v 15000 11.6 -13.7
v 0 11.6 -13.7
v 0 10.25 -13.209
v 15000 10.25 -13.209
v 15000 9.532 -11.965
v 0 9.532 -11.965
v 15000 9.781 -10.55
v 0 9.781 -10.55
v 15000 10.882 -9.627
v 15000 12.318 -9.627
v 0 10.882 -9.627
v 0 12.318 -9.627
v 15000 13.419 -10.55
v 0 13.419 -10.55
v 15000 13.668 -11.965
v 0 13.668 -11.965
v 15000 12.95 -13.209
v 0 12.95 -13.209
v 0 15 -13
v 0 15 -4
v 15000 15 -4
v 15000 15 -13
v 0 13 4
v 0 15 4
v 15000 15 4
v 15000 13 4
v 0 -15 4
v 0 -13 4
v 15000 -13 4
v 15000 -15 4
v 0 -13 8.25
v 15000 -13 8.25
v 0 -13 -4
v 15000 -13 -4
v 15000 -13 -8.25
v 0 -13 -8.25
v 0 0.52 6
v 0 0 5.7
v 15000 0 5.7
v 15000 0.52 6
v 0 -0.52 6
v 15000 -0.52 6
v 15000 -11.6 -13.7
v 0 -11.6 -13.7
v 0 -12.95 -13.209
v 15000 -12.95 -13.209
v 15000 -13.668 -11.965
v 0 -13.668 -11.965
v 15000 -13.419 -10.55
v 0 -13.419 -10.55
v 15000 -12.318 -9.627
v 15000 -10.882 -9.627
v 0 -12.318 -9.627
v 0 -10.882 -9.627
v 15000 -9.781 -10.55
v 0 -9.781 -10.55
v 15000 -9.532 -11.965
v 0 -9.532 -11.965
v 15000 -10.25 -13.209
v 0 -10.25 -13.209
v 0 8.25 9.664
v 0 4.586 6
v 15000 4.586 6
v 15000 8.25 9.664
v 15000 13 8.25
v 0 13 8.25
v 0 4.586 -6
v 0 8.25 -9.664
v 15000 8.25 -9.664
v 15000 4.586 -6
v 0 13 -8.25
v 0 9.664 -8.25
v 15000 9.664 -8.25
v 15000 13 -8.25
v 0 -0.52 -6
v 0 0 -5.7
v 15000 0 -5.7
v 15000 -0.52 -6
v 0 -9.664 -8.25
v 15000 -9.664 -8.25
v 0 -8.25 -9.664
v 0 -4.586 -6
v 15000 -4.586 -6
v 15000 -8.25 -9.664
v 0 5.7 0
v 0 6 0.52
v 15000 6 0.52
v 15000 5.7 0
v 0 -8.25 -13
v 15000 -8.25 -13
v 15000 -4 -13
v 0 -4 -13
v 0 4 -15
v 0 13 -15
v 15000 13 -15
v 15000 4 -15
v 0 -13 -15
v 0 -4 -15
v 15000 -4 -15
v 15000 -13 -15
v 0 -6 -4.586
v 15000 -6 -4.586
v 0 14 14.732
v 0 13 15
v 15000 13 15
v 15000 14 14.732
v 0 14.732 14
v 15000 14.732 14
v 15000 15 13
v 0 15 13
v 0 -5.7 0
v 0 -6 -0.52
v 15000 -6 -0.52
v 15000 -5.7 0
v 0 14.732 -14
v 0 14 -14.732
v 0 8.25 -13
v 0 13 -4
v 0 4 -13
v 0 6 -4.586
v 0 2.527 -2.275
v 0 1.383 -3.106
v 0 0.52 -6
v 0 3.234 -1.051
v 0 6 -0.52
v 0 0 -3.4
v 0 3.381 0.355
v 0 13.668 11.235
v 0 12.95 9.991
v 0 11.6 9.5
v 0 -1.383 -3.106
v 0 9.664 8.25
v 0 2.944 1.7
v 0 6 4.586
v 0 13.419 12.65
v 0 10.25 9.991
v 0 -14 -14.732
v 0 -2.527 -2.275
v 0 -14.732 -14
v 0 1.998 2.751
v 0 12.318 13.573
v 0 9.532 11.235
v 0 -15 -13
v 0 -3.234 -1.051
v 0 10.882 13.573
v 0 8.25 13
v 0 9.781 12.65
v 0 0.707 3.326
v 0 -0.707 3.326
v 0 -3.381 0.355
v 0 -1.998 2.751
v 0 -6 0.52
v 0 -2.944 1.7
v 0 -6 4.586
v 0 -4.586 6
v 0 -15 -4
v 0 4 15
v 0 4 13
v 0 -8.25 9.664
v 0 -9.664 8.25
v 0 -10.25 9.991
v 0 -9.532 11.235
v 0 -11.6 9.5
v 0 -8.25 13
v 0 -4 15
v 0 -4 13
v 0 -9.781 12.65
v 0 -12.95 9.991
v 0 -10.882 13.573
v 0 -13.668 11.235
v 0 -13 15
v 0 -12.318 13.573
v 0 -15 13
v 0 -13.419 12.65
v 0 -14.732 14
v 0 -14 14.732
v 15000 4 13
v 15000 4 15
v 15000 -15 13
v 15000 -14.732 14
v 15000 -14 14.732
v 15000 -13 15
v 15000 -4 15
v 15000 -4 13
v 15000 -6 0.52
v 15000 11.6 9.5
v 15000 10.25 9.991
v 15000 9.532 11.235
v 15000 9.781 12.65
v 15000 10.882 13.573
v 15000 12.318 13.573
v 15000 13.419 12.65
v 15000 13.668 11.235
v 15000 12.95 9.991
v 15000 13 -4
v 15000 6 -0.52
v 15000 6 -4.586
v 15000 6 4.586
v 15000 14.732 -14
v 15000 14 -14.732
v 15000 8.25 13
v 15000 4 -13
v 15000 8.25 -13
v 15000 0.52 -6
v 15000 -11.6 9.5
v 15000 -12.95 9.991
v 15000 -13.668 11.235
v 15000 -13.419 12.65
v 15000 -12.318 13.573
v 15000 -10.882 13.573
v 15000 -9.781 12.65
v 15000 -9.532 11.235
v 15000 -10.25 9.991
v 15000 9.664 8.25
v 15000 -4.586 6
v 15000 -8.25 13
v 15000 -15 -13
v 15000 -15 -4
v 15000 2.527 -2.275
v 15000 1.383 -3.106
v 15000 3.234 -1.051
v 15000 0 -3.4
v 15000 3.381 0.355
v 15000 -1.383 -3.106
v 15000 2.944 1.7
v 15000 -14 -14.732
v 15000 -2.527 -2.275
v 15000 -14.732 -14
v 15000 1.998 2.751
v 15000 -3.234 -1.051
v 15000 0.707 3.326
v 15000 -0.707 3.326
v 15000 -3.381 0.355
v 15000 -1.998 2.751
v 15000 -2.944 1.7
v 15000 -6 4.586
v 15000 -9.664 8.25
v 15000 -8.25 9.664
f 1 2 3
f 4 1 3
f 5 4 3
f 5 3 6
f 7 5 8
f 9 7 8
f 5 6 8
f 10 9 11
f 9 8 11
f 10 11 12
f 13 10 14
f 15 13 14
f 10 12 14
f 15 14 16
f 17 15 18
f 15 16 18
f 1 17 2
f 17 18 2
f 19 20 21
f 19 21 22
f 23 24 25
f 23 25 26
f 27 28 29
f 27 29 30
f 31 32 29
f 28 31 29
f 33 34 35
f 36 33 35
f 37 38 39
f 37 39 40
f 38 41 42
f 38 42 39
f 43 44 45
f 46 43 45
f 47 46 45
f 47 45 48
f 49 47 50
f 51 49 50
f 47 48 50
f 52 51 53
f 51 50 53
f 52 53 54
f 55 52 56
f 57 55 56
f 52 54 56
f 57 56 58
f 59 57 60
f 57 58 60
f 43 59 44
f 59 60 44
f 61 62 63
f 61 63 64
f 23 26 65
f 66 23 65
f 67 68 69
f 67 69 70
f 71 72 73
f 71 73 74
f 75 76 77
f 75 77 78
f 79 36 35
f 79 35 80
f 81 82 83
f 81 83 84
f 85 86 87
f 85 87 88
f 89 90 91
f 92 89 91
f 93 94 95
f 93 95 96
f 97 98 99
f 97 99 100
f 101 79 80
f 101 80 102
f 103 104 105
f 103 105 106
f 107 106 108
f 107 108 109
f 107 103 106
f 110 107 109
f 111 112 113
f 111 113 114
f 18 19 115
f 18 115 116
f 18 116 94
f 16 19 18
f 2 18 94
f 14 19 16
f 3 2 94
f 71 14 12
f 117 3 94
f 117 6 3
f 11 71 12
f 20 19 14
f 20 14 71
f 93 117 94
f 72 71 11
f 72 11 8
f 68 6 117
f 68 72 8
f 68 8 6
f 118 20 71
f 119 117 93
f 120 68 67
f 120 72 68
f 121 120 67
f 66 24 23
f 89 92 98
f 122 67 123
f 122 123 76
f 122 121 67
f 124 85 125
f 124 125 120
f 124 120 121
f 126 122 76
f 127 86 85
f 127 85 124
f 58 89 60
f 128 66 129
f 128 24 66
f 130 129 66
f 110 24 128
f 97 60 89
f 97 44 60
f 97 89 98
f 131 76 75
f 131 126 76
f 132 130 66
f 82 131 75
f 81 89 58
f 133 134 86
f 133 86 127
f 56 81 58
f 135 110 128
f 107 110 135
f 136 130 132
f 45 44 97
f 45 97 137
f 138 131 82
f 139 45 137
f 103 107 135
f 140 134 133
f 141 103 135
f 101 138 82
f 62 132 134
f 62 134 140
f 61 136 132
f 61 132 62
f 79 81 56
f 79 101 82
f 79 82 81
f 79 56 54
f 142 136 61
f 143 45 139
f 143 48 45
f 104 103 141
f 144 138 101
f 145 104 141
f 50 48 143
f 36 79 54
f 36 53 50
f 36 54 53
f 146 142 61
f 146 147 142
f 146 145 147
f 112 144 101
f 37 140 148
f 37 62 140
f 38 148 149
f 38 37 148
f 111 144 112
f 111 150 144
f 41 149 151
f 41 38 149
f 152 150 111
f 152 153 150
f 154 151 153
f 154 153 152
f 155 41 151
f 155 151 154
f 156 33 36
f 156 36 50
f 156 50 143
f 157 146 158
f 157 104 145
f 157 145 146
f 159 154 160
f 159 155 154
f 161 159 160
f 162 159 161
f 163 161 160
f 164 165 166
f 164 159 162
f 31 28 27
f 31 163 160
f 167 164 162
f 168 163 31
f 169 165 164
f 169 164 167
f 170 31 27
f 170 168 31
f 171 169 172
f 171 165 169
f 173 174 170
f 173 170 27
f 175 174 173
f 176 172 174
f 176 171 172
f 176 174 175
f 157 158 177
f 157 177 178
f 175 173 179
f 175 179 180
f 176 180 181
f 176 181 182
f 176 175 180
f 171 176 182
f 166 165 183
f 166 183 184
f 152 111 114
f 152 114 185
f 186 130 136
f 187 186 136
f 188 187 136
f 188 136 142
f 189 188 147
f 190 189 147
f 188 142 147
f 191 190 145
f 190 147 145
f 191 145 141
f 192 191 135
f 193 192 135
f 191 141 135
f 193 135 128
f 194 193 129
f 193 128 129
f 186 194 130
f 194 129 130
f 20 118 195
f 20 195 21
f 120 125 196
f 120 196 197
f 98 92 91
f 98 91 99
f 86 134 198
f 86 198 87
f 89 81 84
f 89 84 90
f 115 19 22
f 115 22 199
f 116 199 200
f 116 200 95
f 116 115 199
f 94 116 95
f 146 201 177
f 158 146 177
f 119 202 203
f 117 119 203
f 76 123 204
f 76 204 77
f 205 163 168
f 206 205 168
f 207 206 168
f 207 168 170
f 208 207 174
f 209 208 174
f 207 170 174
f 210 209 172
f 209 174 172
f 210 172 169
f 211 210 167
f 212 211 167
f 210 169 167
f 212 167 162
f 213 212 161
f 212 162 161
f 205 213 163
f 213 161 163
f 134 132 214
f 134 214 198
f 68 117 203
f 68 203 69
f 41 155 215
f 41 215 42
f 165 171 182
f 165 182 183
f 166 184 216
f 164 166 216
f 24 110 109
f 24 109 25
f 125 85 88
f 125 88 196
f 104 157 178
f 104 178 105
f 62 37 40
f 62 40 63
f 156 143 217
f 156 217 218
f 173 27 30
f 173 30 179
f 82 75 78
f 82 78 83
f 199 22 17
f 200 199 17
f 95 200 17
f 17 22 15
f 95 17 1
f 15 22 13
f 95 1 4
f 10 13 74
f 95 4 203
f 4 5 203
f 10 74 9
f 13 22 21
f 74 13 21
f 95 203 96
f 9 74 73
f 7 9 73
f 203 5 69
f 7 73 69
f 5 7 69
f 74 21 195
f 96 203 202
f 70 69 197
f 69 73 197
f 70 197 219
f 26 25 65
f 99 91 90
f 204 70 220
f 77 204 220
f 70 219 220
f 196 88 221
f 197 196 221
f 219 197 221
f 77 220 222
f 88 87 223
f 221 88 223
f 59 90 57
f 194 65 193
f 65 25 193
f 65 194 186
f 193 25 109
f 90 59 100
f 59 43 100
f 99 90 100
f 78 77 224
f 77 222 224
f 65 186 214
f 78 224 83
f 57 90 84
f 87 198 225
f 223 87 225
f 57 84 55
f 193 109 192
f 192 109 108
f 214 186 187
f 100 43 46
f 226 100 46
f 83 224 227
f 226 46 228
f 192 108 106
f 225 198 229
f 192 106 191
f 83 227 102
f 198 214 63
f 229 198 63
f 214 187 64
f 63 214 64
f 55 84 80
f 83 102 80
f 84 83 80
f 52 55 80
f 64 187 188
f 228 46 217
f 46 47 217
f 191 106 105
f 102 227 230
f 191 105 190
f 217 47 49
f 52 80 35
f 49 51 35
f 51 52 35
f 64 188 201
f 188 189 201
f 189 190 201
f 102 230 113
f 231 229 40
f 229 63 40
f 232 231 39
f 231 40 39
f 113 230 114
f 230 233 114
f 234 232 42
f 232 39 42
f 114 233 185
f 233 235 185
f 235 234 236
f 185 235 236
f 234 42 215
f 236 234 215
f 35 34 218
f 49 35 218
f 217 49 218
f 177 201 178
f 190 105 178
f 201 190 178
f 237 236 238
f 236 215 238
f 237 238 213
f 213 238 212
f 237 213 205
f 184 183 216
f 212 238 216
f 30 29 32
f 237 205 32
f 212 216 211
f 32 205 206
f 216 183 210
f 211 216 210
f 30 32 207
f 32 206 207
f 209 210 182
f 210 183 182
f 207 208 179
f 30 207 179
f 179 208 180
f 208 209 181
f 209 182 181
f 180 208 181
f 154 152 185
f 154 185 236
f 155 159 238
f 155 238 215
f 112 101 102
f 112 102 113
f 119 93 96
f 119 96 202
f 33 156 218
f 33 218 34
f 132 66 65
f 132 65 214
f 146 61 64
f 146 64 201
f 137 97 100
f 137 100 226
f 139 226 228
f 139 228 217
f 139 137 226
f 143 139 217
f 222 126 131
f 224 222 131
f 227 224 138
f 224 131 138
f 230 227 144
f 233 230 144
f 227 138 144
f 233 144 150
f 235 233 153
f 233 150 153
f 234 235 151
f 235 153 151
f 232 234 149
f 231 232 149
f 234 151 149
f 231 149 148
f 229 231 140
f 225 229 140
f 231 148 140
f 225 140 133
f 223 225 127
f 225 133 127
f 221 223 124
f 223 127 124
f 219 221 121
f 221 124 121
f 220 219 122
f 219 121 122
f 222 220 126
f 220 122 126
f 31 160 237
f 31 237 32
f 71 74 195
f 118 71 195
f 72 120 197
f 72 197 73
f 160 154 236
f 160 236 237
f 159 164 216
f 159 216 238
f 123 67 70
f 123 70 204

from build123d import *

# Parameters (mm, degrees)
SKETCH1_R           = 3.4
SKETCH1_R_2         = 2.1
BOSS_EXTRUDE1_DEPTH = 15000


with BuildPart() as part:
    # Sketch1 → Boss-Extrude1 (new body)
    with BuildSketch(Plane(origin=(0, 0, 0), x_dir=(0, -1, 0), z_dir=(-1, 0, 0))):
        with BuildLine():
            Line((13, -4), (13, -8.25))
            Line((13, -8.25), (9.664213562, -8.25))
            Line((9.664213562, -8.25), (6, -4.585786438))
            Line((6, -4.585786438), (6, -0.519615242))
            Line((6, -0.519615242), (5.7, 0))
            Line((5.7, 0), (6, 0.519615242))
            Line((6, 0.519615242), (6, 4.585786438))
            Line((6, 4.585786438), (9.664213562, 8.25))
            Line((9.664213562, 8.25), (13, 8.25))
            Line((13, 8.25), (13, 4))
            Line((13, 4), (15, 4))
            Line((15, 4), (15, 13))
            ThreePointArc((15, 13), (14.414213562, 14.414213562), (13, 15))
            Line((13, 15), (4, 15))
            Line((4, 15), (4, 13))
            Line((4, 13), (8.25, 13))
            Line((8.25, 13), (8.25, 9.664213562))
            Line((8.25, 9.664213562), (4.585786438, 6))
            Line((4.585786438, 6), (0.519615242, 6))
            Line((0.519615242, 6), (0, 5.7))
            Line((0, 5.7), (-0.519615242, 6))
            Line((-0.519615242, 6), (-4.585786438, 6))
            Line((-4.585786438, 6), (-8.25, 9.664213562))
            Line((-8.25, 9.664213562), (-8.25, 13))
            Line((-8.25, 13), (-4, 13))
            Line((-4, 13), (-4, 15))
            Line((-4, 15), (-13, 15))
            ThreePointArc((-13, 15), (-14.414213562, 14.414213562), (-15, 13))
            Line((-15, 13), (-15, 4))
            Line((-15, 4), (-13, 4))
            Line((-13, 4), (-13, 8.25))
            Line((-13, 8.25), (-9.664213562, 8.25))
            Line((-9.664213562, 8.25), (-6, 4.585786438))
            Line((-6, 4.585786438), (-6, 0.519615242))
            Line((-6, 0.519615242), (-5.7, 0))
            Line((-5.7, 0), (-6, -0.519615242))
            Line((-6, -0.519615242), (-6, -4.585786438))
            Line((-6, -4.585786438), (-9.664213562, -8.25))
            Line((-9.664213562, -8.25), (-13, -8.25))
            Line((-13, -8.25), (-13, -4))
            Line((-13, -4), (-15, -4))
            Line((-15, -4), (-15, -13))
            ThreePointArc((-15, -13), (-14.414213562, -14.414213562), (-13, -15))
            Line((-13, -15), (-4, -15))
            Line((-4, -15), (-4, -13))
            Line((-4, -13), (-8.25, -13))
            Line((-8.25, -13), (-8.25, -9.664213562))
            Line((-8.25, -9.664213562), (-4.585786438, -6))
            Line((-4.585786438, -6), (-0.519615242, -6))
            Line((-0.519615242, -6), (0, -5.7))
            Line((0, -5.7), (0.519615242, -6))
            Line((0.519615242, -6), (4.585786438, -6))
            Line((4.585786438, -6), (8.25, -9.664213562))
            Line((8.25, -9.664213562), (8.25, -13))
            Line((8.25, -13), (4, -13))
            Line((4, -13), (4, -15))
            Line((4, -15), (13, -15))
            ThreePointArc((13, -15), (14.414213562, -14.414213562), (15, -13))
            Line((15, -13), (15, -4))
            Line((15, -4), (13, -4))
        make_face()
        with Locations(Location((0, 0, 0), (0, 0, 270))):
            Circle(SKETCH1_R, mode=Mode.SUBTRACT)
        with Locations(Location((11.6, -11.6, 0), (0, 0, 270))):
            Circle(SKETCH1_R_2, mode=Mode.SUBTRACT)
        with Locations(Location((11.6, 11.6, 0), (0, 0, 270))):
            Circle(SKETCH1_R_2, mode=Mode.SUBTRACT)
        with Locations(Location((-11.6, 11.6, 0), (0, 0, 270))):
            Circle(SKETCH1_R_2, mode=Mode.SUBTRACT)
        with Locations(Location((-11.6, -11.6, 0), (0, 0, 270))):
            Circle(SKETCH1_R_2, mode=Mode.SUBTRACT)
    extrude(amount=-BOSS_EXTRUDE1_DEPTH)


solid = part.part
